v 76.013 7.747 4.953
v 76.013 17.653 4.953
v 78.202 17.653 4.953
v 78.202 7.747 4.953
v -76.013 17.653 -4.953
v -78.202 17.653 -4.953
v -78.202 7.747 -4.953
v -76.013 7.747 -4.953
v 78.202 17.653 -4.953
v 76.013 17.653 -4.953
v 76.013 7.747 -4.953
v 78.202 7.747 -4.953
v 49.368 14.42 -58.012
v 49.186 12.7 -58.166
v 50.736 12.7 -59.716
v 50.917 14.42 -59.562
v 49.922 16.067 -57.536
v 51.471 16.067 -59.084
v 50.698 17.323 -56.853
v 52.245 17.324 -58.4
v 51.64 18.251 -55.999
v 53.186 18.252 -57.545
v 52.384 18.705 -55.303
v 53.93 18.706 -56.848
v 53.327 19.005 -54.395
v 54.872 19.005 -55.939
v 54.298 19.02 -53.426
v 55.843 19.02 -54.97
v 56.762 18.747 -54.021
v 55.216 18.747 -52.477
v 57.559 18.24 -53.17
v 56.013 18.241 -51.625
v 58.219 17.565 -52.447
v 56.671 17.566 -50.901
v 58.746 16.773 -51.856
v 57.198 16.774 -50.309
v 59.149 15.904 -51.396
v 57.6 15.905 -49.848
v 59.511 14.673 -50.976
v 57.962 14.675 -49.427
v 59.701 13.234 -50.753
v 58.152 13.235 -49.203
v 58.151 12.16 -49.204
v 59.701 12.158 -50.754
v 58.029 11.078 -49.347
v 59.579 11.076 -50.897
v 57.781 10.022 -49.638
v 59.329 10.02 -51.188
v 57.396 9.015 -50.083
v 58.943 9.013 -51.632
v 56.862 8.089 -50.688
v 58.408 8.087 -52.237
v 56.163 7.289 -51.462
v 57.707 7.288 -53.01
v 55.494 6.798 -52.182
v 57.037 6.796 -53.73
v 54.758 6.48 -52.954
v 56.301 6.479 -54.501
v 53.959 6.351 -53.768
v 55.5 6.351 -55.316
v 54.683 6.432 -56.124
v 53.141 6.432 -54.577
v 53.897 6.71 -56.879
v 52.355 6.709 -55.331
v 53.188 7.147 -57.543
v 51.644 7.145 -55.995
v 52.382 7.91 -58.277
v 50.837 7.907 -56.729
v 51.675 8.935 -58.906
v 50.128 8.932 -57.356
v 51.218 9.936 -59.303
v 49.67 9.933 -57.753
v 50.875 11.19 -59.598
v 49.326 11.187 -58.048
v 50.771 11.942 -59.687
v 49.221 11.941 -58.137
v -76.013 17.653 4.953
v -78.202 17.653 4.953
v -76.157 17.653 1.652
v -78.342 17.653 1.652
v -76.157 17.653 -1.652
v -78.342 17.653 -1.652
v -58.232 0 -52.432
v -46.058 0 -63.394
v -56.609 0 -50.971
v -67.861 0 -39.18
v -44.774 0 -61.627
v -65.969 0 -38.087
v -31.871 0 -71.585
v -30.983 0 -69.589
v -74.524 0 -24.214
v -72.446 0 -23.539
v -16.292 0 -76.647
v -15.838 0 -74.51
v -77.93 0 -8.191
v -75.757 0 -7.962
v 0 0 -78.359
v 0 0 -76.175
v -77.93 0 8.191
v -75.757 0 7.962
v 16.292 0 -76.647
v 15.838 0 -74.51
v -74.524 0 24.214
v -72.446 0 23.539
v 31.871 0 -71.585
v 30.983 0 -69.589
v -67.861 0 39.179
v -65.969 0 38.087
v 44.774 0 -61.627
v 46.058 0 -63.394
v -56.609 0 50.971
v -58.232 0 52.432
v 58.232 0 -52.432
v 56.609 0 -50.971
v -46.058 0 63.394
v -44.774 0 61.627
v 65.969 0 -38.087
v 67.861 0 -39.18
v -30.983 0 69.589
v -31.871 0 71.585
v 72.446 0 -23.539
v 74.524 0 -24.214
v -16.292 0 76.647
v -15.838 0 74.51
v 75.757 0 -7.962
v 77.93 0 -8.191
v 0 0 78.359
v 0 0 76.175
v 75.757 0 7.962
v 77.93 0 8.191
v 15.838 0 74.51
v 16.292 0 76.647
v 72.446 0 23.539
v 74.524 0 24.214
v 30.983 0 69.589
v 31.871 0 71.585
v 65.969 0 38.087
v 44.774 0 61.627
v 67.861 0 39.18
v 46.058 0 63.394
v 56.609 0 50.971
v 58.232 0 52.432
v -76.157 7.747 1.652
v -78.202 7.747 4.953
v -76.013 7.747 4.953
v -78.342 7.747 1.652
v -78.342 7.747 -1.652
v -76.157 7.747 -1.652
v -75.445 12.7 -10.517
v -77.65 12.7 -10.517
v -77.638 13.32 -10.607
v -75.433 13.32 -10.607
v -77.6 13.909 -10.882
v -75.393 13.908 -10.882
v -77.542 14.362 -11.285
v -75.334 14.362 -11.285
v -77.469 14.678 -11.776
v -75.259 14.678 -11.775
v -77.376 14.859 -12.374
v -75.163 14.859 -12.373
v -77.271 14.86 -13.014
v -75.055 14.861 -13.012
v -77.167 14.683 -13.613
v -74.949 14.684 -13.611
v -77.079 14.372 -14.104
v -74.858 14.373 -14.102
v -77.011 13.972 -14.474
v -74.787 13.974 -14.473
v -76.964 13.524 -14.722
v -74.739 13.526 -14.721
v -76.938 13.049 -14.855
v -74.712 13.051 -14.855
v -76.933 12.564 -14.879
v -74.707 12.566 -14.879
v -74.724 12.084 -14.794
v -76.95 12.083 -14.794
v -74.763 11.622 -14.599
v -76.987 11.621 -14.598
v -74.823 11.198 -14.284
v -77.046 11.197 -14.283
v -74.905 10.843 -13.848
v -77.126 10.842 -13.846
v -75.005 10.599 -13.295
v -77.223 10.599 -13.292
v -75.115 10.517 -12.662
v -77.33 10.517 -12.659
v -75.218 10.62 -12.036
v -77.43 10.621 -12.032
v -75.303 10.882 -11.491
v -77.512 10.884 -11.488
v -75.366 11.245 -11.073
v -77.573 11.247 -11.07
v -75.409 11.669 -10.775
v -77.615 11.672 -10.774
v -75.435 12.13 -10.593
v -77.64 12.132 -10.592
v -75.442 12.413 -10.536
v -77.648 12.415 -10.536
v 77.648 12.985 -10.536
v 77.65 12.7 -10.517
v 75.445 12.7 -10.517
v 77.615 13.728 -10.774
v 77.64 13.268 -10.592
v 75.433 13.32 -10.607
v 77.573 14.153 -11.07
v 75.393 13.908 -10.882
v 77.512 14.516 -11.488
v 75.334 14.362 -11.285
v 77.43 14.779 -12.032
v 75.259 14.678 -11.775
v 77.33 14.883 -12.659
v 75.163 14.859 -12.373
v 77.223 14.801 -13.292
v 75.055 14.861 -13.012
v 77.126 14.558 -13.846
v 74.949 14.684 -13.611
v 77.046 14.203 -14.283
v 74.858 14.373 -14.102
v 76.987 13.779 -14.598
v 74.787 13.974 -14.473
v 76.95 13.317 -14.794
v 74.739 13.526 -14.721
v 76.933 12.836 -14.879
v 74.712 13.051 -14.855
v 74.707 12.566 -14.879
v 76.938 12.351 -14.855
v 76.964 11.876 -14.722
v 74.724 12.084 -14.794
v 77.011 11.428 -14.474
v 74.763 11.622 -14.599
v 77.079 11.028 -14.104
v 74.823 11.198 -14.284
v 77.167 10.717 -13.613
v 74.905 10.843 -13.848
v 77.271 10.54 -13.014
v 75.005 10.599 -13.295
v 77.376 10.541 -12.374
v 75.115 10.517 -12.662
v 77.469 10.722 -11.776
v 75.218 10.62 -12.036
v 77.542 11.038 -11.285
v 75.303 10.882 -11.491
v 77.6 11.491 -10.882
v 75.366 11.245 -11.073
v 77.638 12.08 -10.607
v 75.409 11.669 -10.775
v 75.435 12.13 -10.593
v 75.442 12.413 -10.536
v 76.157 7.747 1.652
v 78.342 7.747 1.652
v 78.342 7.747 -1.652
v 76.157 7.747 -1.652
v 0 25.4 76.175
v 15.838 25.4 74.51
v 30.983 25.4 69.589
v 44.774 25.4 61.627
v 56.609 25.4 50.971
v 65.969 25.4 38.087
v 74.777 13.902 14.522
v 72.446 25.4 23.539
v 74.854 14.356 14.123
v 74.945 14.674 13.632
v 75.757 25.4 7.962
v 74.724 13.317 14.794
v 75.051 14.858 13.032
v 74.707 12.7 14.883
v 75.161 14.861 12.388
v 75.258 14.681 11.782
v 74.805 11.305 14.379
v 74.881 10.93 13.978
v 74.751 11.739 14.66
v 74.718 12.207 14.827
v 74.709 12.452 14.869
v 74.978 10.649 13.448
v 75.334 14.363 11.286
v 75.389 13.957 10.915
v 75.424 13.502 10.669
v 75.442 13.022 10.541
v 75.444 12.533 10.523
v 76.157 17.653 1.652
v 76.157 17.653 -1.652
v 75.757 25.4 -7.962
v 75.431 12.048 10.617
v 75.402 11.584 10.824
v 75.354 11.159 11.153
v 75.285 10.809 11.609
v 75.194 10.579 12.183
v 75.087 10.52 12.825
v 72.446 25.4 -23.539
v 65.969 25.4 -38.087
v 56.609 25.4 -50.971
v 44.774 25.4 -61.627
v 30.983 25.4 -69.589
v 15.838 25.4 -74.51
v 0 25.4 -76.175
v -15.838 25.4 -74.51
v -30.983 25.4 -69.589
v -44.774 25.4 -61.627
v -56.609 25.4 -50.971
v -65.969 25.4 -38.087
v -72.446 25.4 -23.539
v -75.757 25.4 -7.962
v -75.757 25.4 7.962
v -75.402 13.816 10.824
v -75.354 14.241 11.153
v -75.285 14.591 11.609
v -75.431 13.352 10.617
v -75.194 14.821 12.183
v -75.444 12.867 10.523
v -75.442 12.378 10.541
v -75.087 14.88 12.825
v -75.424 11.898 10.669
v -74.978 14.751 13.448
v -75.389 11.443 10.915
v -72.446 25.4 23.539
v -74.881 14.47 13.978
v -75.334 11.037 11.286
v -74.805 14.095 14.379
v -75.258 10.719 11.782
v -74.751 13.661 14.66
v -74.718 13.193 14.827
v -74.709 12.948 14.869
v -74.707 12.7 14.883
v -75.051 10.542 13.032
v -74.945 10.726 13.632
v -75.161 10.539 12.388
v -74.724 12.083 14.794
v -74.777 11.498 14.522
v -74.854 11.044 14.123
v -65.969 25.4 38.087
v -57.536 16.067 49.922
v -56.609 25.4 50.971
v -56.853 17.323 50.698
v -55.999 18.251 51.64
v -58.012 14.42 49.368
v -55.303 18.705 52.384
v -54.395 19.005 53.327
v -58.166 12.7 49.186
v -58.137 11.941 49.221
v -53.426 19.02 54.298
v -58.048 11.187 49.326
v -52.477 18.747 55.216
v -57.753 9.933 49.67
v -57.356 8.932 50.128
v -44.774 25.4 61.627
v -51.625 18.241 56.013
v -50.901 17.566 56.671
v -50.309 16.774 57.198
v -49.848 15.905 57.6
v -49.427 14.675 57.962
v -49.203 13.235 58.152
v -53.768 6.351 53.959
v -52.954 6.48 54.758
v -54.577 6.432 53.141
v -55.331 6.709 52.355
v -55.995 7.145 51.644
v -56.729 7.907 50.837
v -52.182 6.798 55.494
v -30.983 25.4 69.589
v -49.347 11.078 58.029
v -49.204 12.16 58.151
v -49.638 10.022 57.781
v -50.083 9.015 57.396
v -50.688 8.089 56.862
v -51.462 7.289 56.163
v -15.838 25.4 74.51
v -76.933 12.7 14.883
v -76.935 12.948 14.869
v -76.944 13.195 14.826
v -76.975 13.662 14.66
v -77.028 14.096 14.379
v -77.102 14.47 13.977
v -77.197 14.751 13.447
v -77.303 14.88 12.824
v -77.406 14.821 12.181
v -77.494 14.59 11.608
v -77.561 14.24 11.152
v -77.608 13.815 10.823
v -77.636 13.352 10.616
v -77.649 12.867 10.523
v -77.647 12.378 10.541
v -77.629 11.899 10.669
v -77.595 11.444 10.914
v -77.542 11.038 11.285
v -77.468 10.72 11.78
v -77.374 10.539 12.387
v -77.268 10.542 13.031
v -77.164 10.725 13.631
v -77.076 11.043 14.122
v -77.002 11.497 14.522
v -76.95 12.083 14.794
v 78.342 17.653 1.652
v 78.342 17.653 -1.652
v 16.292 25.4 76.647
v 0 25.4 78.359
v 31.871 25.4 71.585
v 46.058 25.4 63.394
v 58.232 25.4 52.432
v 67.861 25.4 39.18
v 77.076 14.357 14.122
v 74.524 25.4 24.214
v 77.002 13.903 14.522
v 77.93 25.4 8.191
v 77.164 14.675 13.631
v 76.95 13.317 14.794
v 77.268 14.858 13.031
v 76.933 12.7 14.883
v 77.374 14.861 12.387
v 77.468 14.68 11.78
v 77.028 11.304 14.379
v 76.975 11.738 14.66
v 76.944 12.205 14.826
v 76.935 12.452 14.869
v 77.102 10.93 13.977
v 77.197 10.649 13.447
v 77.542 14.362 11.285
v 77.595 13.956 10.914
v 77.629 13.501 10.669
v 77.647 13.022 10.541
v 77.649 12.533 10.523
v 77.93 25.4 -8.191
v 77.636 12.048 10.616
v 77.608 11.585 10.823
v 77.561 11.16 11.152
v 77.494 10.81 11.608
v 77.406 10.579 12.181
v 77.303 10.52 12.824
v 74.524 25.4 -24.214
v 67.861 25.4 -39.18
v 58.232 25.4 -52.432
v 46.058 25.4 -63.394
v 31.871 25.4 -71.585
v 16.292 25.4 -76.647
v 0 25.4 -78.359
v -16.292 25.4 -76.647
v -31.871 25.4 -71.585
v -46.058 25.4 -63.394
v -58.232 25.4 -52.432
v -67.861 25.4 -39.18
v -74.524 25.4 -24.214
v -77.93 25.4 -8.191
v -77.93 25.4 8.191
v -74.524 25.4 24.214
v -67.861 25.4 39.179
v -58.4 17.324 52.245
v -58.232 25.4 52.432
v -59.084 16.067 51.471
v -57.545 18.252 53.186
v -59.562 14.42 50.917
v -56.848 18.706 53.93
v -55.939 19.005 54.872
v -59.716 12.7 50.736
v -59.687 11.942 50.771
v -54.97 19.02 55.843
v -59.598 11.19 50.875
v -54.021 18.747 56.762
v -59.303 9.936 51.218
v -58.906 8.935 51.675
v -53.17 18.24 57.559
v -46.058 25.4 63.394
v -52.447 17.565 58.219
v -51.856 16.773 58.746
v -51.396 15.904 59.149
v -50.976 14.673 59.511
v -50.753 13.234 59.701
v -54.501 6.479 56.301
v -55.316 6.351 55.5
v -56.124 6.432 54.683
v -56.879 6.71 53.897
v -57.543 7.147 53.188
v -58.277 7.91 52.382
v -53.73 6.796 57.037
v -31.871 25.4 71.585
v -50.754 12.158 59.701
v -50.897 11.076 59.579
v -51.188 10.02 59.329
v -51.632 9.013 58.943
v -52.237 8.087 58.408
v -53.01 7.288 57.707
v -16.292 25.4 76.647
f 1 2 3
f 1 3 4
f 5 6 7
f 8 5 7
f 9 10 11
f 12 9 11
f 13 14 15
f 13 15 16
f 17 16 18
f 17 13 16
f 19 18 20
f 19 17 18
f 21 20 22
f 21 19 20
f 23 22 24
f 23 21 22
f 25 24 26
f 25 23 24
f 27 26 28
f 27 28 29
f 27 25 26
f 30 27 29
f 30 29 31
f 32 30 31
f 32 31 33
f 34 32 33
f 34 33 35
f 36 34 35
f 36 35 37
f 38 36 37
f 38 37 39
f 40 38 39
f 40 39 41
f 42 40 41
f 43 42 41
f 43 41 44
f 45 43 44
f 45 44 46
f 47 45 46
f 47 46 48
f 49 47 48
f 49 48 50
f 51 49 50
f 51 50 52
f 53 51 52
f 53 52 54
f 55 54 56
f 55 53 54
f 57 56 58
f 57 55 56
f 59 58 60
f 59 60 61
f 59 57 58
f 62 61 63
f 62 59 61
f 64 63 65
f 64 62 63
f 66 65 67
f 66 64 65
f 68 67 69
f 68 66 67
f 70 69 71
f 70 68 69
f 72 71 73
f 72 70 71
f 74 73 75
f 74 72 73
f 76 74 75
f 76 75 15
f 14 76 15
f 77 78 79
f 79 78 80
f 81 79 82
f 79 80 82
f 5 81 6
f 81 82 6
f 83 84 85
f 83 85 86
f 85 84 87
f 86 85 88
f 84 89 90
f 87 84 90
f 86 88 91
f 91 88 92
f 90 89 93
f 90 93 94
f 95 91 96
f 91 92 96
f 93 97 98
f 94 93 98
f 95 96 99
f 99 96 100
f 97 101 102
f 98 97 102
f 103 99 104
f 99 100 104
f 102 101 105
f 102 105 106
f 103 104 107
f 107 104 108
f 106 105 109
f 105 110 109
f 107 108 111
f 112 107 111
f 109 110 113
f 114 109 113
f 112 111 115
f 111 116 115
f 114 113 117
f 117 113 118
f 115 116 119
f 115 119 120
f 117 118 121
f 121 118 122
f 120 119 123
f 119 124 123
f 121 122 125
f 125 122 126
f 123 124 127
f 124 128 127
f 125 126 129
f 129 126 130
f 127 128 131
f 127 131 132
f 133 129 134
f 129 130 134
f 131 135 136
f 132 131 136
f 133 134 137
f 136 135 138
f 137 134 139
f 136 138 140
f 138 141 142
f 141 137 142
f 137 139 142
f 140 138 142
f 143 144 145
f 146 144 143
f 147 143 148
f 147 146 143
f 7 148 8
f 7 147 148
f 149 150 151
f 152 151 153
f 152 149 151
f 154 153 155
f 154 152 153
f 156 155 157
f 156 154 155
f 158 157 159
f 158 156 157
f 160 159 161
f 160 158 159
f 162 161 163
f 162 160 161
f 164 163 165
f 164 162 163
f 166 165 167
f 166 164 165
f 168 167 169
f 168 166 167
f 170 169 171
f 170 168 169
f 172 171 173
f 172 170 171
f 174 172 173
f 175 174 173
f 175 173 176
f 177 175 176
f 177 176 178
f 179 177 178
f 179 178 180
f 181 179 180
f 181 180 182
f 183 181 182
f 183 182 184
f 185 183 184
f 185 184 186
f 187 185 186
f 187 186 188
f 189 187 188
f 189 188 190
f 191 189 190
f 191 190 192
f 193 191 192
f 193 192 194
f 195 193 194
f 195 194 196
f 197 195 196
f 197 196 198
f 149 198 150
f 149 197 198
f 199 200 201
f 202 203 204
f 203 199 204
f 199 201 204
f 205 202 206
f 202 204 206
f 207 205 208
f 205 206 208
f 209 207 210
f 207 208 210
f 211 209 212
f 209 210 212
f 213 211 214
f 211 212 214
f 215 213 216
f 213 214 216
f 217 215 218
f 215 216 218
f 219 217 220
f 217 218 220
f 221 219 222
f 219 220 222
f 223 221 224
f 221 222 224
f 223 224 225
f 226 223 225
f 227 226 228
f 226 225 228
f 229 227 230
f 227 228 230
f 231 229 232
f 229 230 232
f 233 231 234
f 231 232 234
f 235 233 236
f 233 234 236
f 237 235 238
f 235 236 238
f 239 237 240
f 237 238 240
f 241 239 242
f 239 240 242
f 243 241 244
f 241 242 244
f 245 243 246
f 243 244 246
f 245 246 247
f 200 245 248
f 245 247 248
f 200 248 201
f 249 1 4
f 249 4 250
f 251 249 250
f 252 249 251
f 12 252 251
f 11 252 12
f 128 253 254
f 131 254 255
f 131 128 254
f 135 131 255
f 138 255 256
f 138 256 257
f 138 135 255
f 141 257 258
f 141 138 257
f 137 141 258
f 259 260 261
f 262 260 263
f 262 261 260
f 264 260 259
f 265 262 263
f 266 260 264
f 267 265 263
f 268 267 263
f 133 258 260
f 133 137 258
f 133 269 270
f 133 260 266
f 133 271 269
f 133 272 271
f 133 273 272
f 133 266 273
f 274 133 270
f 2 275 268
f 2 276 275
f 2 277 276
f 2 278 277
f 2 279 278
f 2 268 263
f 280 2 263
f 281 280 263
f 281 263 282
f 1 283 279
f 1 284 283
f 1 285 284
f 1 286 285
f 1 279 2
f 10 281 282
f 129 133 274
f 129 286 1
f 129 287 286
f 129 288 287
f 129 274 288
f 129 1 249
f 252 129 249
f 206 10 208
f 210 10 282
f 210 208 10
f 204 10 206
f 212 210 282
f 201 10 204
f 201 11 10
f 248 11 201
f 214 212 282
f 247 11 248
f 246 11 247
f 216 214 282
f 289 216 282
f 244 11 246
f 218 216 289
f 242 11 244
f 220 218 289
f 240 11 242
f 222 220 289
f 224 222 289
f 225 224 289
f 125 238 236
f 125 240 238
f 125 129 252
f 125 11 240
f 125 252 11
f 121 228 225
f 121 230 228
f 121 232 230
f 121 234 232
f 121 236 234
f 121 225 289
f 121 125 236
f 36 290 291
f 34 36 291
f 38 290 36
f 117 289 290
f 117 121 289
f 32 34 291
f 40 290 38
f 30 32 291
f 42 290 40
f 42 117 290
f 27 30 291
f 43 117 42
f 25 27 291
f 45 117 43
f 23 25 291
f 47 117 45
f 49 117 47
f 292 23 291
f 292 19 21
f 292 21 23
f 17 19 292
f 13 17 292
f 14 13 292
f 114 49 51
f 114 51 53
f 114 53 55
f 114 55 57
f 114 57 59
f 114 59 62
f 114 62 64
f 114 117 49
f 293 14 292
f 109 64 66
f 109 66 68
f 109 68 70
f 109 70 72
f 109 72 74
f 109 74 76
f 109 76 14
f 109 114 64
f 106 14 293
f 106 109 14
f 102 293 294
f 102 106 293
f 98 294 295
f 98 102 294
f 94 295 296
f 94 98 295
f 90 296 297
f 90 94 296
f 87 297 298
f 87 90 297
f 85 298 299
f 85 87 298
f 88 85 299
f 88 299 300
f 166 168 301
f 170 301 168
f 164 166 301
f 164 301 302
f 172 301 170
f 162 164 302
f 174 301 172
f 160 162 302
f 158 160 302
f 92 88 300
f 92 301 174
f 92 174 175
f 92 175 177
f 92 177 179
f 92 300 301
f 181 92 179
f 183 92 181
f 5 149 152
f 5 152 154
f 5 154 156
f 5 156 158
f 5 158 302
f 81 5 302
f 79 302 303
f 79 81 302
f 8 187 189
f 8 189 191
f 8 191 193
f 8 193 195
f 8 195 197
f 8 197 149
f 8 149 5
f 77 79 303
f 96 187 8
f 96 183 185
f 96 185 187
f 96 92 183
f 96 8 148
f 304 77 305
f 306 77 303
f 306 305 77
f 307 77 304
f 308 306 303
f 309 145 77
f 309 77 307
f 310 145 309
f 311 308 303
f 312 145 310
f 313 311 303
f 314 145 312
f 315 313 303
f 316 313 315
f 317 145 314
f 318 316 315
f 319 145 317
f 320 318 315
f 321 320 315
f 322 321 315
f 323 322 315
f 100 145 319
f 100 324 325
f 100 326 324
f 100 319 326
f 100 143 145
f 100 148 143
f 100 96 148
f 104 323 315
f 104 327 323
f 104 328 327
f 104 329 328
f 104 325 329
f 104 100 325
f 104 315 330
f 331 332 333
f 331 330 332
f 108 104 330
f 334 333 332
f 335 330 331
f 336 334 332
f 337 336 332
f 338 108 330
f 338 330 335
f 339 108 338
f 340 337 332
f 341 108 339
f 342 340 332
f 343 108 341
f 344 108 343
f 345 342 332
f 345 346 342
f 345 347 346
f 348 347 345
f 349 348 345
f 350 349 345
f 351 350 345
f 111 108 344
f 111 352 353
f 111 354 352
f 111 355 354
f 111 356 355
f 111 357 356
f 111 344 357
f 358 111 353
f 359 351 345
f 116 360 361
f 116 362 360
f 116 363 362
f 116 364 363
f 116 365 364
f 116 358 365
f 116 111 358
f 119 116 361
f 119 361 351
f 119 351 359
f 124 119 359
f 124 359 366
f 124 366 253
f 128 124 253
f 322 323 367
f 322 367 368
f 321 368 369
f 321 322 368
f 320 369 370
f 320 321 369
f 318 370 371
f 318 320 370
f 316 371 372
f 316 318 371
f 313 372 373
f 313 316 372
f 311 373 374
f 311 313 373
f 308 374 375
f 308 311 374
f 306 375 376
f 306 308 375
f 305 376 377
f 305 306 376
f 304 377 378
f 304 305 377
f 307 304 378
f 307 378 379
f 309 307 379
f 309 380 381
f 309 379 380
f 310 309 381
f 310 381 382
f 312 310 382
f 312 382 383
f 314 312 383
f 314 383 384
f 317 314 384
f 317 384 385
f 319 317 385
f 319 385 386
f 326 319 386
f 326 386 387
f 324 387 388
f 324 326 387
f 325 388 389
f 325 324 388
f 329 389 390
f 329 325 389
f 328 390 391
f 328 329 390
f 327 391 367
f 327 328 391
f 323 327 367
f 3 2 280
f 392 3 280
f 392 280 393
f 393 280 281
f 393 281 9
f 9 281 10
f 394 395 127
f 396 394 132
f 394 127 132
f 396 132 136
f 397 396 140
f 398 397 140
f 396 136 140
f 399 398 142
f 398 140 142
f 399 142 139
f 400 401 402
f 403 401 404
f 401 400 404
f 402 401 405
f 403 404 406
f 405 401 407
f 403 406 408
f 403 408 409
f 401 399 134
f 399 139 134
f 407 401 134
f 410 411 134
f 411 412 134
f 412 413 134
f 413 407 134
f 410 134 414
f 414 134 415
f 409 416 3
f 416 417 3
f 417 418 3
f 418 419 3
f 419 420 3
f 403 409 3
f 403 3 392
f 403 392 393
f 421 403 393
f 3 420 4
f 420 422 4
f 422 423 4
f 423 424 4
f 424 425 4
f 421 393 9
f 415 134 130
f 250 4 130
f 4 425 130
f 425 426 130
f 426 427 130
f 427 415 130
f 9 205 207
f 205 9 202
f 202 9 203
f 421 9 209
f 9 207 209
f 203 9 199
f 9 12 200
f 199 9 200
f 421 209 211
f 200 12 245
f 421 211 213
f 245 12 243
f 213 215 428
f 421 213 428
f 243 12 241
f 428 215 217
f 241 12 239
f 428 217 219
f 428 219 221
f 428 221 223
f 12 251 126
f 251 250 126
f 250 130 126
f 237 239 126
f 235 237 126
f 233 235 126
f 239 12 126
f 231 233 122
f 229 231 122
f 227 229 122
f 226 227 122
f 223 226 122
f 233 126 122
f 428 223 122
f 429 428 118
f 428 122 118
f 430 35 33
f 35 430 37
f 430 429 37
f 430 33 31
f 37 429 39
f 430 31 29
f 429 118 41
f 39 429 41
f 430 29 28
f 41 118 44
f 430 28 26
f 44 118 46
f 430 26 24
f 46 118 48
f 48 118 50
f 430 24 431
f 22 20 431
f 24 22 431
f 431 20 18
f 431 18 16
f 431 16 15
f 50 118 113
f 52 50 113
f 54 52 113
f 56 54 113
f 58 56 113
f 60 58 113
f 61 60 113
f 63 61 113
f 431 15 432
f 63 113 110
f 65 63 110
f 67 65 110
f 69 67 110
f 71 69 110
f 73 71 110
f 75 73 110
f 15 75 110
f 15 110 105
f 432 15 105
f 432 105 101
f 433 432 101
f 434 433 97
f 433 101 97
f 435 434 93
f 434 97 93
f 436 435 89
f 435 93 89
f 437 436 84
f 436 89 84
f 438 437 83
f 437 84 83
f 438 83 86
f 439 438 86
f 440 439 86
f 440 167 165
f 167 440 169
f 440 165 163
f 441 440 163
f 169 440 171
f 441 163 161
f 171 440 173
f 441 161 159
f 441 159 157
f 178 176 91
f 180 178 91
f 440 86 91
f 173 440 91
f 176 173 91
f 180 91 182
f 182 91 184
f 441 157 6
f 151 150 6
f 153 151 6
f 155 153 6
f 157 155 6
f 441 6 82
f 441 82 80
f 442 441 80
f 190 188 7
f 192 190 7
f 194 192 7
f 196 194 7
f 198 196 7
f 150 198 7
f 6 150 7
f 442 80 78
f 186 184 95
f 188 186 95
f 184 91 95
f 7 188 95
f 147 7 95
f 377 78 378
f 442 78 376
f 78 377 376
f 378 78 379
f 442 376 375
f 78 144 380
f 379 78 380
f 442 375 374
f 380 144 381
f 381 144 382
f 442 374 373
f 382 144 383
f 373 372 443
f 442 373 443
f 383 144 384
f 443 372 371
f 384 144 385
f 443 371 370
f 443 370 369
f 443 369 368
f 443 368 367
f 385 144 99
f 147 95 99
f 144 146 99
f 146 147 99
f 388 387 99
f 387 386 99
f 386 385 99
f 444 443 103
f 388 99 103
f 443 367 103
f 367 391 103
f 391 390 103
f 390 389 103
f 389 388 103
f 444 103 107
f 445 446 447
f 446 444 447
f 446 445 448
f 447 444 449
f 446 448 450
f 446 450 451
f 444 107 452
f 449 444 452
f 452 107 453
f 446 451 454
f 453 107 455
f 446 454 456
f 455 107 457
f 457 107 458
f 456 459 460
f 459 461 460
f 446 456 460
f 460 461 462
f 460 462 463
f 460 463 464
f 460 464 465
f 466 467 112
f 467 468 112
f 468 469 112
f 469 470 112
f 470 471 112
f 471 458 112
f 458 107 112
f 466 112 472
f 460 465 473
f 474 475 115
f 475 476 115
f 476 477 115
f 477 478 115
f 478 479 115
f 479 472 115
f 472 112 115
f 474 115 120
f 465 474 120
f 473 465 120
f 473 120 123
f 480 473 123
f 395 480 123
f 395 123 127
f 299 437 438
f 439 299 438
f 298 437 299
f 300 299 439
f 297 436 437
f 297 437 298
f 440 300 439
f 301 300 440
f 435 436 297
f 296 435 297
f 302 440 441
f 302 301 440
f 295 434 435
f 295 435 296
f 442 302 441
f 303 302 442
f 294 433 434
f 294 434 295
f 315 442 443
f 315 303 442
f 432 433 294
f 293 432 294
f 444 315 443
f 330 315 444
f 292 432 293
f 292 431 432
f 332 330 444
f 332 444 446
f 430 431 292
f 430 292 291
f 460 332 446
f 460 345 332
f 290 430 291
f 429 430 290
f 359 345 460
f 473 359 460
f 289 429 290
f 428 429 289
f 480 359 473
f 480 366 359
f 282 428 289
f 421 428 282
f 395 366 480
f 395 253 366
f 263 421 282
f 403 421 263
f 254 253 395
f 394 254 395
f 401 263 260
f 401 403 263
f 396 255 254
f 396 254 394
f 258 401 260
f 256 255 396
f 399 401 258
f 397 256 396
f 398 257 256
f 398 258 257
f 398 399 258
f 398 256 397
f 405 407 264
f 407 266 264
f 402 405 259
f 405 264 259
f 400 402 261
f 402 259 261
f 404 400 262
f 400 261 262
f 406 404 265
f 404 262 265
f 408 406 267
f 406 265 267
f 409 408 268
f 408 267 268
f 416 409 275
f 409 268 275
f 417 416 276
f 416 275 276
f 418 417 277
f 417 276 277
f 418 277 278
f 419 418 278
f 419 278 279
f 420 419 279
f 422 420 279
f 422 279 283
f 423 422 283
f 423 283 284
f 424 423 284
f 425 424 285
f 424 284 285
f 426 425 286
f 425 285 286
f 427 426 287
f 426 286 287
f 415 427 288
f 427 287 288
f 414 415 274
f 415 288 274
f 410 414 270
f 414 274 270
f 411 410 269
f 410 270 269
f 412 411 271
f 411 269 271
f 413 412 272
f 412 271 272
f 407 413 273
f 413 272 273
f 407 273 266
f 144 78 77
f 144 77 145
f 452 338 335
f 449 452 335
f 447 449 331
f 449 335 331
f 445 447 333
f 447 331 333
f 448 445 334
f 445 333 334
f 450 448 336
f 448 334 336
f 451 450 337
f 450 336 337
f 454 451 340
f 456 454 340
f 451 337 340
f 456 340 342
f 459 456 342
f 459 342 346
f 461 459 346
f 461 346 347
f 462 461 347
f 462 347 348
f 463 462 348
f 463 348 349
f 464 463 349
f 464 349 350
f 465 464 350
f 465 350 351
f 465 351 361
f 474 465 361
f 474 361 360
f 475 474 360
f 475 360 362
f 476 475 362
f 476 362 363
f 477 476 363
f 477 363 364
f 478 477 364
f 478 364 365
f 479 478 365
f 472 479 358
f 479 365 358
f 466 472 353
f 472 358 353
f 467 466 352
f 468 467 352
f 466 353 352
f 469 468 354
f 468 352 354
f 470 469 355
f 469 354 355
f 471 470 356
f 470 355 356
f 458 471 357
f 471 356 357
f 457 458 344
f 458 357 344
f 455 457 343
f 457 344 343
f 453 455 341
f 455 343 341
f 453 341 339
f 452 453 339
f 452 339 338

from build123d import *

# Parameters (mm, degrees)
SKETCH1_R                                    = 78.359
SKETCH1_R_2                                  = 76.1746
BOSS_EXTRUDE1_DEPTH                          = 25.4
SKETCH2_W                                    = 9.906
SKETCH2_H                                    = 9.906
SKETCH2_R                                    = 2.18313
CUT_EXTRUDE1_DEPTH                           = 114.690042493
MIRROR2_AT_THE_SECOND_PLANE_COPY_1_SKETC_R   = 78.359
MIRROR2_AT_THE_SECOND_PLANE_COPY_1_SKETC_R_2 = 76.1746
MIRROR2_AT_THE_SECOND_PLANE_COPY_1_DEPTH     = 25.4
MIRROR2_AT_THE_SECOND_PLANE_COPY_2_SKETC_W   = 9.906
MIRROR2_AT_THE_SECOND_PLANE_COPY_2_SKETC_H   = 9.906
MIRROR2_AT_THE_SECOND_PLANE_COPY_2_SKETC_R   = 2.18313
MIRROR2_AT_THE_SECOND_PLANE_COPY_2_DEPTH     = 114.690042493
CUT_EXTRUDE2_DEPTH                           = 114.690042653
CUT_EXTRUDE2_DEPTH_BACK                      = 114.690042653
SKETCH3_R                                    = 6.35


with BuildPart() as part:
    # Sketch1 → Boss-Extrude1 (new body)
    with BuildSketch(Plane(origin=(0, 0, 0), x_dir=(1, 0, 0), z_dir=(0, 1, 0))):
        Circle(SKETCH1_R)
        Circle(SKETCH1_R_2, mode=Mode.SUBTRACT)
    boss_extrude1 = extrude(amount=BOSS_EXTRUDE1_DEPTH)

    # Sketch2 → Cut-Extrude1 (cut, symmetric)
    with BuildSketch(Plane(origin=(0, 0, 0), x_dir=(0, 0, -1), z_dir=(1, 0, 0))):
        with Locations((0, 12.7)):
            Rectangle(SKETCH2_W, SKETCH2_H)
        with Locations((-12.7, 12.7)):
            Circle(SKETCH2_R)
        with Locations((12.7, 12.7)):
            Circle(SKETCH2_R)
    cut_extrude1 = extrude(amount=CUT_EXTRUDE1_DEPTH, both=True, mode=Mode.SUBTRACT)

    # Mirror2: Boss-Extrude1, Cut-Extrude1 across plane
    add(boss_extrude1.mirror(Plane(origin=(0, 0, 0), x_dir=(0, 0, 1), z_dir=(1, 0, 0))))
    add(cut_extrude1.mirror(Plane(origin=(0, 0, 0), x_dir=(0, 0, 1), z_dir=(1, 0, 0))), mode=Mode.SUBTRACT)

    # Mirror2 at the second plane: Boss-Extrude1, Cut-Extrude1 across plane
    add(boss_extrude1.mirror(Plane.ZX.offset(12.7)))
    add(cut_extrude1.mirror(Plane.ZX.offset(12.7)), mode=Mode.SUBTRACT)

    # Mirror2 at the second plane copy 1 sketc → Mirror2 at the second plane copy 1 (add)
    with BuildSketch(Plane(origin=(0, 25.4, 0), x_dir=(-1, 0, 0), z_dir=(0, -1, 0))):
        Circle(MIRROR2_AT_THE_SECOND_PLANE_COPY_1_SKETC_R)
        Circle(MIRROR2_AT_THE_SECOND_PLANE_COPY_1_SKETC_R_2, mode=Mode.SUBTRACT)
    extrude(amount=MIRROR2_AT_THE_SECOND_PLANE_COPY_1_DEPTH)

    # Mirror2 at the second plane copy 2 sketc → Mirror2 at the second plane copy 2 (cut, symmetric)
    with BuildSketch(Plane(origin=(0, 25.4, 0), x_dir=(0, 0, -1), z_dir=(-1, 0, 0))):
        with Locations((0, 12.7)):
            Rectangle(MIRROR2_AT_THE_SECOND_PLANE_COPY_2_SKETC_W, MIRROR2_AT_THE_SECOND_PLANE_COPY_2_SKETC_H)
        with Locations((-12.7, 12.7)):
            Circle(MIRROR2_AT_THE_SECOND_PLANE_COPY_2_SKETC_R)
        with Locations((12.7, 12.7)):
            Circle(MIRROR2_AT_THE_SECOND_PLANE_COPY_2_SKETC_R)
    extrude(amount=MIRROR2_AT_THE_SECOND_PLANE_COPY_2_DEPTH, both=True, mode=Mode.SUBTRACT)

    # Sketch3 → Cut-Extrude2 (cut, two sides: drawn at the far end of the back side and taken through both)
    with BuildSketch(Plane(origin=(0, 0, 0), x_dir=(-0.7071067811865477, 0, -0.7071067811865475), z_dir=(0.7071067811865475, 0, -0.7071067811865477)).offset(-CUT_EXTRUDE2_DEPTH_BACK)):
        with Locations((0, 12.7)):
            Circle(SKETCH3_R)
    extrude(amount=CUT_EXTRUDE2_DEPTH + CUT_EXTRUDE2_DEPTH_BACK, mode=Mode.SUBTRACT)


solid = part.part
